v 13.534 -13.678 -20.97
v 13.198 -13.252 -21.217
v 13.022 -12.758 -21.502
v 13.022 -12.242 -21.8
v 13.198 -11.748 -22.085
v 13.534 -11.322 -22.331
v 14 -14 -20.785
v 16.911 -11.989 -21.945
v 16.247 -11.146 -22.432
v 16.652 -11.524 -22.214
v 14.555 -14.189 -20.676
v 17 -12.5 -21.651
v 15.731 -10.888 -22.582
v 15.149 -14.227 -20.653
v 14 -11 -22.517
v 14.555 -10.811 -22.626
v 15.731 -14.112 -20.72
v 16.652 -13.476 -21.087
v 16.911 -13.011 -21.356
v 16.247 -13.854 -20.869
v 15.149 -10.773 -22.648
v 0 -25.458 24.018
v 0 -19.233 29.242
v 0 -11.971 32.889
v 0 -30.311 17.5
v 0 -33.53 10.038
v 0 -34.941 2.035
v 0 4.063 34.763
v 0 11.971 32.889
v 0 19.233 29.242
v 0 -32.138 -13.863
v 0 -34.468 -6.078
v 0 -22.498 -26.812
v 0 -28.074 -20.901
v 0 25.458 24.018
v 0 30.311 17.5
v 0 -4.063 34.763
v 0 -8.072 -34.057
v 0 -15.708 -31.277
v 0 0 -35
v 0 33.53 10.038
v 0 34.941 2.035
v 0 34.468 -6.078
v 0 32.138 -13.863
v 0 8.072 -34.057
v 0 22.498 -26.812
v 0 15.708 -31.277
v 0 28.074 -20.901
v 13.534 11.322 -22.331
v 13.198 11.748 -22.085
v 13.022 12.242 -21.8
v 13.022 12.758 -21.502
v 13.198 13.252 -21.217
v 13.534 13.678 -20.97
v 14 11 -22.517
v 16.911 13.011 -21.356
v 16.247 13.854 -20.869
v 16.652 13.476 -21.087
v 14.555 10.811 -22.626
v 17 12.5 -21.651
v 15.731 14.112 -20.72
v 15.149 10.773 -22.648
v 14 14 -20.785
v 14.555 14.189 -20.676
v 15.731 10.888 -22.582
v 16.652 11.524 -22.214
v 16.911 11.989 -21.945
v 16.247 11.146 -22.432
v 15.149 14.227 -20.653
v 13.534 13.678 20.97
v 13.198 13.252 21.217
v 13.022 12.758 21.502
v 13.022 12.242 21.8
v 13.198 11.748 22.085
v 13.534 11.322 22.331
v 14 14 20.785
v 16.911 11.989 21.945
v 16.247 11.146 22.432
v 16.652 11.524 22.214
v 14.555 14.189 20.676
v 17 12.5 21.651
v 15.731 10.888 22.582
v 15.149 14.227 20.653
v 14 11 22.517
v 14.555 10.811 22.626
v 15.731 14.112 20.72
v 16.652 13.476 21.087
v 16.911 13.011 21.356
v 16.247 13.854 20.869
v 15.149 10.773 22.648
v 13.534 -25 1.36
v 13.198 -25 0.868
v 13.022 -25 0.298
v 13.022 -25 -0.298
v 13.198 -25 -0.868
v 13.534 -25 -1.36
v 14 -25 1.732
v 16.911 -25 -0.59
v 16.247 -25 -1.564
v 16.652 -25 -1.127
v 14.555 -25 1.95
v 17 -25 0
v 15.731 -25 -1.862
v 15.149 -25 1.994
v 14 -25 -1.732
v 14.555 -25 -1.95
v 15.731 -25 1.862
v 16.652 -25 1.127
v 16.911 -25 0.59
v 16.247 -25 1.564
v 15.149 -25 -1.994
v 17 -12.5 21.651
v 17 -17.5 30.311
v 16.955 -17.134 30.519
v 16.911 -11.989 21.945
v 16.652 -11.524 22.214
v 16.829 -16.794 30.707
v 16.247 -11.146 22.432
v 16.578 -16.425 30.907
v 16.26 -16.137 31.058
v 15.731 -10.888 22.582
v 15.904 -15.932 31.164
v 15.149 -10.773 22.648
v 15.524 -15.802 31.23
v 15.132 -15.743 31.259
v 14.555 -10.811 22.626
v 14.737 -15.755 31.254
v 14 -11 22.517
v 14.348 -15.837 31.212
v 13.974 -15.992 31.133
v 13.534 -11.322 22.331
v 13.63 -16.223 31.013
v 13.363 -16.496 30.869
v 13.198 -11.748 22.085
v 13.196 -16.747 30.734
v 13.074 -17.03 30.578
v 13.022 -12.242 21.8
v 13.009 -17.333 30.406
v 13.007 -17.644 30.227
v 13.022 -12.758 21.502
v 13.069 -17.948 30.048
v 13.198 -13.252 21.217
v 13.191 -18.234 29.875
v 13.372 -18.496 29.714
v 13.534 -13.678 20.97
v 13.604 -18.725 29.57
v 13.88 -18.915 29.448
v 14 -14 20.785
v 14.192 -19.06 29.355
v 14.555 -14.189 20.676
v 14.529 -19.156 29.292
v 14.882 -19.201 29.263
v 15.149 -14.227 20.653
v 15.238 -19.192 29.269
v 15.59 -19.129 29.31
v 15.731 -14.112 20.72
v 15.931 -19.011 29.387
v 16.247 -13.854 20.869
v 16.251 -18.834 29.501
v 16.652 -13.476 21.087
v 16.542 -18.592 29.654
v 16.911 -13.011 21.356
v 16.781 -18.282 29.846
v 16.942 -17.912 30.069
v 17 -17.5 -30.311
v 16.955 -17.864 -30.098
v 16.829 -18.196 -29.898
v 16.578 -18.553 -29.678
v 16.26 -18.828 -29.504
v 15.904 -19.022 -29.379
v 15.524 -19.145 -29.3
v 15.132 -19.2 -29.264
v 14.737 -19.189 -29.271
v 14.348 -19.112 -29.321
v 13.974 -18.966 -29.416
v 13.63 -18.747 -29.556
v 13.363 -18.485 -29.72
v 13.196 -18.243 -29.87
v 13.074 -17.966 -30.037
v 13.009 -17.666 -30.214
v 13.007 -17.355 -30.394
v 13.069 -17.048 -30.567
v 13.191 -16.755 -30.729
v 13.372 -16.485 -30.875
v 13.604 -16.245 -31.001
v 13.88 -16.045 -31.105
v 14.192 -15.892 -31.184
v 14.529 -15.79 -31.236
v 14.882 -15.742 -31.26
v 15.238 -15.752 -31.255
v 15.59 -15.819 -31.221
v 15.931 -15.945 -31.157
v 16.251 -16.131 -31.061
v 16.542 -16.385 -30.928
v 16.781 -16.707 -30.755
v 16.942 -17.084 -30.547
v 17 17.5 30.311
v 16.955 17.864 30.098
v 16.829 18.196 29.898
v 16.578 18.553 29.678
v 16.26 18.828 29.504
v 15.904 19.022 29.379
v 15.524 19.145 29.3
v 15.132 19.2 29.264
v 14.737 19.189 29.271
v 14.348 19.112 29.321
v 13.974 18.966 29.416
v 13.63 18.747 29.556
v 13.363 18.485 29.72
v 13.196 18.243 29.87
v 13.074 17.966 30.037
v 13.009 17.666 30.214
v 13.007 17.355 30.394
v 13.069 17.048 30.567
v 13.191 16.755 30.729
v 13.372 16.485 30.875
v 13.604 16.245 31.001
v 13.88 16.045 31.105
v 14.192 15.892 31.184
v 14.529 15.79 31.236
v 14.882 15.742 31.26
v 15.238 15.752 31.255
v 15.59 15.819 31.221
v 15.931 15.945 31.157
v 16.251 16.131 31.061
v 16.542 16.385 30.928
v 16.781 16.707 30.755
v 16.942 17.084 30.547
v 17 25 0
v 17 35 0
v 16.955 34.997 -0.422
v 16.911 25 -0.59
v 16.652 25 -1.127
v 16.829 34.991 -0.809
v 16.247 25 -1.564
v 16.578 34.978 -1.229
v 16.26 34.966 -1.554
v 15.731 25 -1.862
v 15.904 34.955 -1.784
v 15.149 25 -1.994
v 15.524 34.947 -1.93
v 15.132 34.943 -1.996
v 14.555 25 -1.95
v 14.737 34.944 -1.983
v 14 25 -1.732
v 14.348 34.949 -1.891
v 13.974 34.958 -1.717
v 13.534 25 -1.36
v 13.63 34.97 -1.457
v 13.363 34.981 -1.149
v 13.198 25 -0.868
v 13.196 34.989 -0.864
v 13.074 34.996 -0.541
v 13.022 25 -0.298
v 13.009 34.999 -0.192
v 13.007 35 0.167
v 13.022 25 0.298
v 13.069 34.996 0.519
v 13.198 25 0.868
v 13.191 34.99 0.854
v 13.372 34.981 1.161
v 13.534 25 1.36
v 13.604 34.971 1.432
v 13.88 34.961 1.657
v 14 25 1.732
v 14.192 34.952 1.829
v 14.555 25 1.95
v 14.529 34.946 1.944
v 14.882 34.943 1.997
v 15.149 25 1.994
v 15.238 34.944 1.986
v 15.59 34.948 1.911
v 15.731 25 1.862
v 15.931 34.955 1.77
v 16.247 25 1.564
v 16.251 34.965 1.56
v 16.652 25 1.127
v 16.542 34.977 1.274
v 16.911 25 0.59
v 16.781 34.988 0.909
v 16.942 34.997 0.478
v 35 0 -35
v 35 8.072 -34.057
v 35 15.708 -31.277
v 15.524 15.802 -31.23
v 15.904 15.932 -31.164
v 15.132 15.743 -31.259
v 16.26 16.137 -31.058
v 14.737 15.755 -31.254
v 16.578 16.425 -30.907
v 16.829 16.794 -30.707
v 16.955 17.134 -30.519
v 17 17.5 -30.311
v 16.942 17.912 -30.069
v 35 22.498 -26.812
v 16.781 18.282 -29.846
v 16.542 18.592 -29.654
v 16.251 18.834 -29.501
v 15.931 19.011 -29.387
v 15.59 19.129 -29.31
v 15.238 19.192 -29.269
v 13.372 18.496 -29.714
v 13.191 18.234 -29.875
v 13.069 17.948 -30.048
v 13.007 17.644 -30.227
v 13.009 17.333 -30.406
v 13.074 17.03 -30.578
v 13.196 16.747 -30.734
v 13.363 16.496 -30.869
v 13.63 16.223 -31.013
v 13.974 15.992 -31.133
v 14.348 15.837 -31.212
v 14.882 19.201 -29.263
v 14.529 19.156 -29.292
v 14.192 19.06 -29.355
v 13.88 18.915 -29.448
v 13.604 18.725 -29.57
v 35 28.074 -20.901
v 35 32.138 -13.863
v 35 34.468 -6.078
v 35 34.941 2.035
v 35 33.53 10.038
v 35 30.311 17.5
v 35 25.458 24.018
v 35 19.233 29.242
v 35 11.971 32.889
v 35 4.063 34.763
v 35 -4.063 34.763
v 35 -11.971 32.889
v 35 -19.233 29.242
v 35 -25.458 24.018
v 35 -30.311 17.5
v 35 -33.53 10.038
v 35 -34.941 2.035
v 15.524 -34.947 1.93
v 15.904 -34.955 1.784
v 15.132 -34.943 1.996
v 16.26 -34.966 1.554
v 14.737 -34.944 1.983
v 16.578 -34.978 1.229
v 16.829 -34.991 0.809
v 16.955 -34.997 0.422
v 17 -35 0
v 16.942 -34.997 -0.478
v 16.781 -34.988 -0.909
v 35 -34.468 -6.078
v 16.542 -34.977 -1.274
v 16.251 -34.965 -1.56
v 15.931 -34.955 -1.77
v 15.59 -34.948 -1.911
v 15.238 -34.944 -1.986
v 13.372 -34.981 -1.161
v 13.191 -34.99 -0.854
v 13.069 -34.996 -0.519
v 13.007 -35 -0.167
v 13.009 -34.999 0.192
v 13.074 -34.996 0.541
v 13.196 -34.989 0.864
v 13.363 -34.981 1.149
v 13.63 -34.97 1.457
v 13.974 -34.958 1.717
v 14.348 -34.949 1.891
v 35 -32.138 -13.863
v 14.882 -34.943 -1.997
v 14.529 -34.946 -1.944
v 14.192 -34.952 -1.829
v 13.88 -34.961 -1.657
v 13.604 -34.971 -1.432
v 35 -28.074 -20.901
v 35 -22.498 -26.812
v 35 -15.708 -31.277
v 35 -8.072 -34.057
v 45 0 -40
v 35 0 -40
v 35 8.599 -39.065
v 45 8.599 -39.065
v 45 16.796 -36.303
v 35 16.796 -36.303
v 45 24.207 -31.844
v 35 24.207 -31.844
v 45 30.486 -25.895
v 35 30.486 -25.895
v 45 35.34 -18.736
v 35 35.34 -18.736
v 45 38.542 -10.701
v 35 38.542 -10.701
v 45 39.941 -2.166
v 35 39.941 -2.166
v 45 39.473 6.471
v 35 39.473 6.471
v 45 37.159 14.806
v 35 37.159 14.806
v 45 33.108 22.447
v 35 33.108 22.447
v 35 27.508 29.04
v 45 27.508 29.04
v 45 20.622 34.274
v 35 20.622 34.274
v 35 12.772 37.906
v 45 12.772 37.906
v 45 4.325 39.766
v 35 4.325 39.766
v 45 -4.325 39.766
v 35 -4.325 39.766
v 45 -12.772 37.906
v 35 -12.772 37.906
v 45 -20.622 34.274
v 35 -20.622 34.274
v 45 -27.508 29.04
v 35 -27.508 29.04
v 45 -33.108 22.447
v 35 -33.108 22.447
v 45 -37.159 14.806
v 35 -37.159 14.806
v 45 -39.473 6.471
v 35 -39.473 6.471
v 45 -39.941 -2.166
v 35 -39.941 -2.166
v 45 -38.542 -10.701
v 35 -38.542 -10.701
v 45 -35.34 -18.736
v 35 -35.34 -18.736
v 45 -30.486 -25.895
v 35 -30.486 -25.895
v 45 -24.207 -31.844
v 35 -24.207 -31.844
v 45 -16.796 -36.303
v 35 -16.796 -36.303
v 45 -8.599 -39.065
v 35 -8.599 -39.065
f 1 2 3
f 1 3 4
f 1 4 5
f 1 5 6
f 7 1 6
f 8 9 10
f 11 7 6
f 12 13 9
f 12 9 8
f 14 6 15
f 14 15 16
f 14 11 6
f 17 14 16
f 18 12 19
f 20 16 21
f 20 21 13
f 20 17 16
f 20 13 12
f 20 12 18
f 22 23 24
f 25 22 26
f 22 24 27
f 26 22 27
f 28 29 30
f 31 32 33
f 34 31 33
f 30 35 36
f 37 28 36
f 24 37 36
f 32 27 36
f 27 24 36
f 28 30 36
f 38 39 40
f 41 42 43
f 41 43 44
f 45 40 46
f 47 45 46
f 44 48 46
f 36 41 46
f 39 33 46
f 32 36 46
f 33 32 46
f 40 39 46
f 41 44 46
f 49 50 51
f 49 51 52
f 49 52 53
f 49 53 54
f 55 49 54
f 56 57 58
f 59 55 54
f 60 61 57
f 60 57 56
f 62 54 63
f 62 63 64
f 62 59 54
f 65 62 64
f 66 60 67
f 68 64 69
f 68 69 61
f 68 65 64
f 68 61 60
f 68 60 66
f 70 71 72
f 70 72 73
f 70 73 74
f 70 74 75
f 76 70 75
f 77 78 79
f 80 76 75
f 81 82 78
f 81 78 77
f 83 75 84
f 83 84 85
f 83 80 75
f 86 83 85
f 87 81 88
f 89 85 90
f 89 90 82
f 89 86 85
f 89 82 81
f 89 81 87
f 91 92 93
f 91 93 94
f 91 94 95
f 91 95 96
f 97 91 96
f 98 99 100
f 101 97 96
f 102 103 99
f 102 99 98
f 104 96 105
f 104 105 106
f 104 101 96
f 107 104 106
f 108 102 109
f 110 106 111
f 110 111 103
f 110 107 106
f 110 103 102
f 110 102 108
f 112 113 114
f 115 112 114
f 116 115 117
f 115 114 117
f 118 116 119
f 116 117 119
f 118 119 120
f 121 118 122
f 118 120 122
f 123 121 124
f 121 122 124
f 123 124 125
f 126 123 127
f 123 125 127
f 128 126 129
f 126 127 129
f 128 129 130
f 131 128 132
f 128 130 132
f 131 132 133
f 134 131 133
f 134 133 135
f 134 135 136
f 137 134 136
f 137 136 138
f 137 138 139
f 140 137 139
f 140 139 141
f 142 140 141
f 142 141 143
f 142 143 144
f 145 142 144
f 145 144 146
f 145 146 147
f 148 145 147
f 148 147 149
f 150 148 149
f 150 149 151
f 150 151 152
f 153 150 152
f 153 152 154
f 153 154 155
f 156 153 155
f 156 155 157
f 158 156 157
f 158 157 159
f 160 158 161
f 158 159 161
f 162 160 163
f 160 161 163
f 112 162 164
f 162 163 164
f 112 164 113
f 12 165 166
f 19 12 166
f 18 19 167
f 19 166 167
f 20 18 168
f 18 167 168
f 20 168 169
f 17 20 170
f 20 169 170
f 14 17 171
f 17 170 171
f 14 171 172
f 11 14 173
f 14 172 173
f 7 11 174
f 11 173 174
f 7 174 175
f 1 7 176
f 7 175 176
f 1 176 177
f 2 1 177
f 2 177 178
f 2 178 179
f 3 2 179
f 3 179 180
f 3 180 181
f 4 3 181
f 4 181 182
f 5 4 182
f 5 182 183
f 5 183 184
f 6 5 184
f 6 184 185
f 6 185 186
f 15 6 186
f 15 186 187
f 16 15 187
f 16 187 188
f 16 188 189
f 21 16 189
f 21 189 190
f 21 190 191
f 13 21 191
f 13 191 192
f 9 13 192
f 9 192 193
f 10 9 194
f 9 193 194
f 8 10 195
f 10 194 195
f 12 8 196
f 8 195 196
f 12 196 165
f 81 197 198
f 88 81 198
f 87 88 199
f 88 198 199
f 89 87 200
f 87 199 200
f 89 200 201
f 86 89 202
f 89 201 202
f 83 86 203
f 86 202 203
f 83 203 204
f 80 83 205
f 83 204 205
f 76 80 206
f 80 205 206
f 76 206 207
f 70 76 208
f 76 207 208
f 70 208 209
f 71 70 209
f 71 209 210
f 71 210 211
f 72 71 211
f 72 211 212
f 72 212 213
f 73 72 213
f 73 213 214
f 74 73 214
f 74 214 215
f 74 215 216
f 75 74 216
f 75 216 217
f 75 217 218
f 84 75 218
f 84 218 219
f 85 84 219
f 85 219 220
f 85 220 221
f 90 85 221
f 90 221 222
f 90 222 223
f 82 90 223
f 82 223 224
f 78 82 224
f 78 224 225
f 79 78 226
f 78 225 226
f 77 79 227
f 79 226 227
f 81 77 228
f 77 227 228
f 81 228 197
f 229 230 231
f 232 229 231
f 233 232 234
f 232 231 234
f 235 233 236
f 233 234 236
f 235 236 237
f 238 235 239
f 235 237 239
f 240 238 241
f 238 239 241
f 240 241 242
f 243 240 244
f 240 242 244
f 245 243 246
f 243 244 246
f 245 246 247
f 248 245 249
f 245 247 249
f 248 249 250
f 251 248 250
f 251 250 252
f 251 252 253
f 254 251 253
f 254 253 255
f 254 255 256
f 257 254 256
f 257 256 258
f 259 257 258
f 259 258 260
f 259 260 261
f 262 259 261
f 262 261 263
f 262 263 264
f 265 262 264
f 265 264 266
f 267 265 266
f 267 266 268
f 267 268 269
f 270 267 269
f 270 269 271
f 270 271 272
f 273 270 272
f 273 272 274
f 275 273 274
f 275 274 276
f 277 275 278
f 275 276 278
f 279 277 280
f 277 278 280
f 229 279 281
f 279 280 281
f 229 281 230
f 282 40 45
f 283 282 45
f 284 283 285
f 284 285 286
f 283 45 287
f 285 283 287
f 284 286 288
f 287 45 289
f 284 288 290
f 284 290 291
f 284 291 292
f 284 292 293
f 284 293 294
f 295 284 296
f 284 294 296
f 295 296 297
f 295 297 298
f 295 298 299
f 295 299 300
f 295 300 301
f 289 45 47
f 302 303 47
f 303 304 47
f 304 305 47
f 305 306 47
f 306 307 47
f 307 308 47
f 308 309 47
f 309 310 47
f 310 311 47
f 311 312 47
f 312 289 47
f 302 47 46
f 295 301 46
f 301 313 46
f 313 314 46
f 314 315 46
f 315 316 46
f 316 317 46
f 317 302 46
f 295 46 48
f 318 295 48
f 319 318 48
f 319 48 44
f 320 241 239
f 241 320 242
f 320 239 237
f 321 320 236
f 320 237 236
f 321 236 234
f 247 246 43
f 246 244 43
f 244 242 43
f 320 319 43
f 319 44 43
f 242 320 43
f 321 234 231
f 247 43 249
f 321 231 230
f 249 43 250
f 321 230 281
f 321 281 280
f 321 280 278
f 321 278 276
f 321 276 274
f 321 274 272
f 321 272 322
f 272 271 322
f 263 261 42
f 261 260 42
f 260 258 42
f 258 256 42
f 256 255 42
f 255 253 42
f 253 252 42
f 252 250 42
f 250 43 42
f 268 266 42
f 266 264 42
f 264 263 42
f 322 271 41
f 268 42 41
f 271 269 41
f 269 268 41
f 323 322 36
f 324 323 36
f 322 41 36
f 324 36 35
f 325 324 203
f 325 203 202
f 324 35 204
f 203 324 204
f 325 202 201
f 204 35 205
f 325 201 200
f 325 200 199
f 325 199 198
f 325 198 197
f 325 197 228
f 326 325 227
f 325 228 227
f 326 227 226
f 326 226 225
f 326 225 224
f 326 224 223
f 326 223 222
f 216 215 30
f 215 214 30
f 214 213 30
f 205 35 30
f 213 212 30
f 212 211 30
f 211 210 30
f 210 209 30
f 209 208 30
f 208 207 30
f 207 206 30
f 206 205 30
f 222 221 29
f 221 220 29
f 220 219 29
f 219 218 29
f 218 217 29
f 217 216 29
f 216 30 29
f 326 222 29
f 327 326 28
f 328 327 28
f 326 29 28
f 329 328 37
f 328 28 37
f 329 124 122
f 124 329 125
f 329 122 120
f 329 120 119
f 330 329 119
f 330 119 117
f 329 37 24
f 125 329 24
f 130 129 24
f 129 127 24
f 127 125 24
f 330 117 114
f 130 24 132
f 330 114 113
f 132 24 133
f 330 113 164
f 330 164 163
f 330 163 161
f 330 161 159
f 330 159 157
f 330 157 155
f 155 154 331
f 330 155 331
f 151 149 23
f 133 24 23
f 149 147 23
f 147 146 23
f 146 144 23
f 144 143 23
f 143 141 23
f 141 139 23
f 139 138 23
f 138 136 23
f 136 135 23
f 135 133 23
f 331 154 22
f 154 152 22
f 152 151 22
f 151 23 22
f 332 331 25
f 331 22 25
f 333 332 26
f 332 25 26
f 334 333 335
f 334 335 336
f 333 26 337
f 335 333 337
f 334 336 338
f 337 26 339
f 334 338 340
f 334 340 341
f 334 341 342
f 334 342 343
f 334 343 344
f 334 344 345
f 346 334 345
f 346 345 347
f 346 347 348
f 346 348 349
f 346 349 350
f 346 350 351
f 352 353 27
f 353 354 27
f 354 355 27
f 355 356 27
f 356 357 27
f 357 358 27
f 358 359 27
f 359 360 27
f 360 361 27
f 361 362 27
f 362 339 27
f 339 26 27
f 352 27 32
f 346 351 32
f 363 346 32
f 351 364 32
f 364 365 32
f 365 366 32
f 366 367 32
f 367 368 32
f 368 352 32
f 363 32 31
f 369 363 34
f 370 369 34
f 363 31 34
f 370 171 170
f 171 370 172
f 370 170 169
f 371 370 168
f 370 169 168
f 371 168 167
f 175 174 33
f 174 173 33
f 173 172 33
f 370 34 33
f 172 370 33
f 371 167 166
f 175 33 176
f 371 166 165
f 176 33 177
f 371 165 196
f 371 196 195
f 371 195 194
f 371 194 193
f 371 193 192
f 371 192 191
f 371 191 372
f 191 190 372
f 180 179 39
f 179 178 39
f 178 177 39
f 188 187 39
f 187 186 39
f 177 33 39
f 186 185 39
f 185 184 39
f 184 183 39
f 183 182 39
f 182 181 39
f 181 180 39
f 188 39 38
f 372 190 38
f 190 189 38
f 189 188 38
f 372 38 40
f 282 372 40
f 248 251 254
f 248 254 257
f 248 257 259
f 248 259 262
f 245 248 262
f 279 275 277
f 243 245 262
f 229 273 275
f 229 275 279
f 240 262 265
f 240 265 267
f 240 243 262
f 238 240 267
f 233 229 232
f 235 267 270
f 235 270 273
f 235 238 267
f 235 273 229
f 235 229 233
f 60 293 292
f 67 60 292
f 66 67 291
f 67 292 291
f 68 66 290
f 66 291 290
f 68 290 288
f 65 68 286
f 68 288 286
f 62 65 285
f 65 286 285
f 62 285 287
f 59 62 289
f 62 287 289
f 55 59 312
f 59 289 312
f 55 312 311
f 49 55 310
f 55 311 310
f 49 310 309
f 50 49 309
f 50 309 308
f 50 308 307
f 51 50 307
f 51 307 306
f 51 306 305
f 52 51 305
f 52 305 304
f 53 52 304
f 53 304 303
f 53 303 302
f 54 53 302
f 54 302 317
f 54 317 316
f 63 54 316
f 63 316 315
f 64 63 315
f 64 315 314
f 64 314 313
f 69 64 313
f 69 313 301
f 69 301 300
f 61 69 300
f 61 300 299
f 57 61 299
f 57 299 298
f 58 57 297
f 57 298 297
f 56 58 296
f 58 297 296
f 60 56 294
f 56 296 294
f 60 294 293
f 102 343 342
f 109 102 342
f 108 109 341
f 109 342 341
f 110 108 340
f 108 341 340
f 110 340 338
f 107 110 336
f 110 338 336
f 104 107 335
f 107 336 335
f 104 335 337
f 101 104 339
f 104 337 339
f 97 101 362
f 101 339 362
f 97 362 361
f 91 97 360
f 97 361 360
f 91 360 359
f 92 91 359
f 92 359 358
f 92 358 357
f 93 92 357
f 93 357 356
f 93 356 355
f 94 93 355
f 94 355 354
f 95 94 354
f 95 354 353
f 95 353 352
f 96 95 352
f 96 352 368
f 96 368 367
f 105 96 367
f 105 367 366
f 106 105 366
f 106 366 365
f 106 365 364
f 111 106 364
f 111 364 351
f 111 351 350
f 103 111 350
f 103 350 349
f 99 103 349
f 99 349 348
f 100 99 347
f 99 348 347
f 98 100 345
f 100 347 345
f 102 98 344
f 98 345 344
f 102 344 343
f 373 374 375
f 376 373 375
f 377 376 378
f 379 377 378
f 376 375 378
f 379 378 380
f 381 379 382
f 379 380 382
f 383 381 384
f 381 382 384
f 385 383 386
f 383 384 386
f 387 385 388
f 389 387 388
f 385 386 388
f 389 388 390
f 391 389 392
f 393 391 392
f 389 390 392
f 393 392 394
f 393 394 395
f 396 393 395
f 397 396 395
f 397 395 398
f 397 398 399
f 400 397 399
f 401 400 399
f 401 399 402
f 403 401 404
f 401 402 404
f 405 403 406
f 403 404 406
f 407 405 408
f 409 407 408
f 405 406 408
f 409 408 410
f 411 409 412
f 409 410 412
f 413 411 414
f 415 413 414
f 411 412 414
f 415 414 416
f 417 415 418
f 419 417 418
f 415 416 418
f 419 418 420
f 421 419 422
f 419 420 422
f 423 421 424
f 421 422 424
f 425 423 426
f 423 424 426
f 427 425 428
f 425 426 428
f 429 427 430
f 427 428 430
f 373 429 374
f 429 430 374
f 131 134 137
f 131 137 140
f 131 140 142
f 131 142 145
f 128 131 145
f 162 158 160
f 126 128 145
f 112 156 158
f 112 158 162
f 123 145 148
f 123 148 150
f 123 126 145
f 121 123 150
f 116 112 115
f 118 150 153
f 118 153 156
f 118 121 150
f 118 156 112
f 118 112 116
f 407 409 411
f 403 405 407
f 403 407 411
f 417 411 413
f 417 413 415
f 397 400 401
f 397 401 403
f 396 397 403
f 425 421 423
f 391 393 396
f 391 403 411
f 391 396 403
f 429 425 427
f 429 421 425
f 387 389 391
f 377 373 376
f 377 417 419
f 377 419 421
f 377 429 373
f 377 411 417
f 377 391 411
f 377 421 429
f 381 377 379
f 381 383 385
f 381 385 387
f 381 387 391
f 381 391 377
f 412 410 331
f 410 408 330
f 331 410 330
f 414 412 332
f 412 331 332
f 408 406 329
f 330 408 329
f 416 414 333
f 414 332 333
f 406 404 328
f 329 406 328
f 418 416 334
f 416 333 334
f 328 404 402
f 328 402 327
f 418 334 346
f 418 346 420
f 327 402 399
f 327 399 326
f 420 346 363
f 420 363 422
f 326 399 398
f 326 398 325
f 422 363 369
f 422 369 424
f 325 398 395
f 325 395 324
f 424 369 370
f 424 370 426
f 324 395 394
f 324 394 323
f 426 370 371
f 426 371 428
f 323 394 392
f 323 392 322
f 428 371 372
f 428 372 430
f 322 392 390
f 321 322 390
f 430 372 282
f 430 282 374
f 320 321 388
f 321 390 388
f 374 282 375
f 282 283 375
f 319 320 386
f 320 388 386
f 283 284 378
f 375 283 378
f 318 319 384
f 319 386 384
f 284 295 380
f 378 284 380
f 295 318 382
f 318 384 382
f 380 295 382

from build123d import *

# Parameters (mm, degrees)
SKETCH1_R           = 35
BOSS_EXTRUDE1_DEPTH = 35
SKETCH2_R           = 40
BOSS_EXTRUDE2_DEPTH = 10
SKETCH3_R           = 2
CUT_EXTRUDE1_DEPTH  = 10
CIRPATTERN1_COUNT   = 6


with BuildPart() as part:
    # Sketch1 → Boss-Extrude1 (new body)
    with BuildSketch(Plane(origin=(0, 0, 0), x_dir=(0, 0, -1), z_dir=(1, 0, 0))):
        Circle(SKETCH1_R)
    extrude(amount=BOSS_EXTRUDE1_DEPTH)

    # Sketch2 → Boss-Extrude2 (add)
    with BuildSketch(Plane(origin=(35, 0, 0), x_dir=(0, 0, -1), z_dir=(1, 0, 0))):
        Circle(SKETCH2_R)
    extrude(amount=BOSS_EXTRUDE2_DEPTH)

    # Sketch3 → Cut-Extrude1 (cut)
    with BuildSketch(Plane(origin=(0, 35, 0), x_dir=(1, 0, 0), z_dir=(0, 1, 0))):
        with Locations((15, 0)):
            Circle(SKETCH3_R)
    cut_extrude1 = extrude(amount=-CUT_EXTRUDE1_DEPTH, mode=Mode.SUBTRACT)

    # CirPattern1: Cut-Extrude1 ×6 about axis
    cirpattern1_axis = Axis((0, 0, 0), (1, 0, 0))
    for i in range(1, CIRPATTERN1_COUNT):
        add(cut_extrude1.rotate(cirpattern1_axis, i * 360 / CIRPATTERN1_COUNT), mode=Mode.SUBTRACT)


solid = part.part
